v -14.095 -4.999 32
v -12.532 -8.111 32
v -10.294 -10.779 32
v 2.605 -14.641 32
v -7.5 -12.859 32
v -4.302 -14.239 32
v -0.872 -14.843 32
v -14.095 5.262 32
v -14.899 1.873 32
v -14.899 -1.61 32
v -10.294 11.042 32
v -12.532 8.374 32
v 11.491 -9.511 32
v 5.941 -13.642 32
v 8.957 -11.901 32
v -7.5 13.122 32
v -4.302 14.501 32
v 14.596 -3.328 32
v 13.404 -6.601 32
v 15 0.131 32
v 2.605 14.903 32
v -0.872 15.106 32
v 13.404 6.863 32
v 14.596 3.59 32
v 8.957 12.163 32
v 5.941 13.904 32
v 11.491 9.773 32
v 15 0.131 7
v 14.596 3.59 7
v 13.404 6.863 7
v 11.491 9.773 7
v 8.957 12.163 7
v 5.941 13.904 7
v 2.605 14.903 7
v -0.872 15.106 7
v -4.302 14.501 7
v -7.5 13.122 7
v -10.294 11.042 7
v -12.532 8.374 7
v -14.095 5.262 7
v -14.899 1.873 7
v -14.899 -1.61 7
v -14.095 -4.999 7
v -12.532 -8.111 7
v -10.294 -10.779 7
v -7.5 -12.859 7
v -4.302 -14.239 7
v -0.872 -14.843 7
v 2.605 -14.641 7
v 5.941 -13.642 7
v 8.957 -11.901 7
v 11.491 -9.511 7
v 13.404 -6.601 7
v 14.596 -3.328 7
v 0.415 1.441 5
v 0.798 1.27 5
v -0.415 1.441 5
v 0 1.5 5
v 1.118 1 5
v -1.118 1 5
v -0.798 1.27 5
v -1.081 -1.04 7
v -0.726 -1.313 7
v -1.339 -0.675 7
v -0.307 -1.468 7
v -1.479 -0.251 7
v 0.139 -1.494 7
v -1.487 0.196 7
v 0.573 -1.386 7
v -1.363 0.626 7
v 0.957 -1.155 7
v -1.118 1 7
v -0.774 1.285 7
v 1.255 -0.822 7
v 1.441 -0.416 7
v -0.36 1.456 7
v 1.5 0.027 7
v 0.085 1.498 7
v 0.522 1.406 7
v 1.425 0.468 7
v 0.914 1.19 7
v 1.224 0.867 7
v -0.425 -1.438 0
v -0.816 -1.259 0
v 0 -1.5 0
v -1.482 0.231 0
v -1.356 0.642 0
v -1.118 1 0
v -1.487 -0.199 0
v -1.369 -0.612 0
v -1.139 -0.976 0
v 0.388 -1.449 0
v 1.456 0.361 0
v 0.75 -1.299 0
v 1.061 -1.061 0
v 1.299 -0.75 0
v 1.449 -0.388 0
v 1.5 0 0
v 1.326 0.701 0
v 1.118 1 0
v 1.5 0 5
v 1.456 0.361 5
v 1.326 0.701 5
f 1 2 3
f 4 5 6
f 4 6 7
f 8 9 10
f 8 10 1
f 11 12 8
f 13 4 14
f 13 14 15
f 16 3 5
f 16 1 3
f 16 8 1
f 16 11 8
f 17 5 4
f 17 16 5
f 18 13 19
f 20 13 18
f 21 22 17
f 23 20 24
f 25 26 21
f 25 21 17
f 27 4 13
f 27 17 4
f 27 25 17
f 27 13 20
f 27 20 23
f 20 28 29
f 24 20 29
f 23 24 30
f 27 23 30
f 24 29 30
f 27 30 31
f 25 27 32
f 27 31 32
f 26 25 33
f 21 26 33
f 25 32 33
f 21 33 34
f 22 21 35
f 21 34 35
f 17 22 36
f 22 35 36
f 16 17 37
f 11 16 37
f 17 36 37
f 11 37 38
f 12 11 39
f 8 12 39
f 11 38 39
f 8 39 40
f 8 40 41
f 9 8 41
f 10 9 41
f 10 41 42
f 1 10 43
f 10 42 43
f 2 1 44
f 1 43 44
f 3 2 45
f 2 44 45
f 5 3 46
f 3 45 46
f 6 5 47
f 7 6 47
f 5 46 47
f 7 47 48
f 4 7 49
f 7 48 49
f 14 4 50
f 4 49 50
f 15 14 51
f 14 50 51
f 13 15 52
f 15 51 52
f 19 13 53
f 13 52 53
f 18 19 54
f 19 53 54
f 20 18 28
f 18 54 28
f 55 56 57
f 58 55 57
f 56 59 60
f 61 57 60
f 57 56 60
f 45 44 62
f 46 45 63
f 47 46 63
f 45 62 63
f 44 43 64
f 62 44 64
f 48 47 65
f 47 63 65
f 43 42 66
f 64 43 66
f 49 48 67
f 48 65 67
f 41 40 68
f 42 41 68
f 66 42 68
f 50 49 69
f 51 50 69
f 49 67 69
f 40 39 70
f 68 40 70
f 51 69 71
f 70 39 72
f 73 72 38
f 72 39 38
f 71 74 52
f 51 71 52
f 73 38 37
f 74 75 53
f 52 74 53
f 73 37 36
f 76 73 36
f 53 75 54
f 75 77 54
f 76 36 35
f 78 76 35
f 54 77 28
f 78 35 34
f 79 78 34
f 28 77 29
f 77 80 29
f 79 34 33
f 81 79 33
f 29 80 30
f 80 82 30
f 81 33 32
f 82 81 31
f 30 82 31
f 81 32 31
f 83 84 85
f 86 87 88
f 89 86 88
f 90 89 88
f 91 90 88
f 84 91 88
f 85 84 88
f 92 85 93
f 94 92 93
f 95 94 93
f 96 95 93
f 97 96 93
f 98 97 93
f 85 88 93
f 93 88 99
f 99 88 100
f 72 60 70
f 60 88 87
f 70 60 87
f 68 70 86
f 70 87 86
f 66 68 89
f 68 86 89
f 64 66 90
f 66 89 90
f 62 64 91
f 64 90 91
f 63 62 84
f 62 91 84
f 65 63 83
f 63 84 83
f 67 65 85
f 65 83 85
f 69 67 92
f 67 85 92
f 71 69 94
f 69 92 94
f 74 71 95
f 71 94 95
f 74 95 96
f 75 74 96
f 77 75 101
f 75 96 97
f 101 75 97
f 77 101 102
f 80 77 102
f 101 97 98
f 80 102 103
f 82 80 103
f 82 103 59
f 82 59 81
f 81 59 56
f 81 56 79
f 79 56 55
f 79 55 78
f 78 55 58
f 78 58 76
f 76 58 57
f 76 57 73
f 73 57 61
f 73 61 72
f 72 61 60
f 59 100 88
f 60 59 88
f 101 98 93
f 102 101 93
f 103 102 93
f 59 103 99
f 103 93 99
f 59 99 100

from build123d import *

# Parameters (mm, degrees)
BOSS_EXTRU_1_DEPTH = 5
ESQUISSE2_R        = 1.5
BOSS_EXTRU_2_DEPTH = 2
ESQUISSE3_R        = 15
BOSS_EXTRU_3_DEPTH = 25


with BuildPart() as part:
    # Esquisse1 → Boss.-Extru.1 (new body)
    with BuildSketch(Plane.XY):
        with BuildLine():
            ThreePointArc((-1.118033989, 1), (-1.369306394, -0.612372436), (0, -1.5))
            Line((0, -1.5), (0, 1))
            Line((0, 1), (-1.118033989, 1))
        make_face()
        with BuildLine():
            Line((0, 1), (0, -1.5))
            ThreePointArc((0, -1.5), (1.060660172, -1.060660172), (1.5, 0))
            ThreePointArc((1.5, 0), (1.401258538, 0.535233135), (1.118033989, 1))
            Line((1.118033989, 1), (0, 1))
        make_face()
    extrude(amount=BOSS_EXTRU_1_DEPTH)

    # Esquisse2 → Boss.-Extru.2 (add)
    with BuildSketch(Plane.XY.offset(5)):
        with Locations(Location((0, 0, 0), (0, 0, 138.189685104))):
            Circle(ESQUISSE2_R)
    extrude(amount=BOSS_EXTRU_2_DEPTH)

    # Esquisse3 → Boss.-Extru.3 (add)
    with BuildSketch(Plane.XY.offset(7)):
        with Locations((0, 0.131238961)):
            Circle(ESQUISSE3_R)
    extrude(amount=BOSS_EXTRU_3_DEPTH)


solid = part.part
